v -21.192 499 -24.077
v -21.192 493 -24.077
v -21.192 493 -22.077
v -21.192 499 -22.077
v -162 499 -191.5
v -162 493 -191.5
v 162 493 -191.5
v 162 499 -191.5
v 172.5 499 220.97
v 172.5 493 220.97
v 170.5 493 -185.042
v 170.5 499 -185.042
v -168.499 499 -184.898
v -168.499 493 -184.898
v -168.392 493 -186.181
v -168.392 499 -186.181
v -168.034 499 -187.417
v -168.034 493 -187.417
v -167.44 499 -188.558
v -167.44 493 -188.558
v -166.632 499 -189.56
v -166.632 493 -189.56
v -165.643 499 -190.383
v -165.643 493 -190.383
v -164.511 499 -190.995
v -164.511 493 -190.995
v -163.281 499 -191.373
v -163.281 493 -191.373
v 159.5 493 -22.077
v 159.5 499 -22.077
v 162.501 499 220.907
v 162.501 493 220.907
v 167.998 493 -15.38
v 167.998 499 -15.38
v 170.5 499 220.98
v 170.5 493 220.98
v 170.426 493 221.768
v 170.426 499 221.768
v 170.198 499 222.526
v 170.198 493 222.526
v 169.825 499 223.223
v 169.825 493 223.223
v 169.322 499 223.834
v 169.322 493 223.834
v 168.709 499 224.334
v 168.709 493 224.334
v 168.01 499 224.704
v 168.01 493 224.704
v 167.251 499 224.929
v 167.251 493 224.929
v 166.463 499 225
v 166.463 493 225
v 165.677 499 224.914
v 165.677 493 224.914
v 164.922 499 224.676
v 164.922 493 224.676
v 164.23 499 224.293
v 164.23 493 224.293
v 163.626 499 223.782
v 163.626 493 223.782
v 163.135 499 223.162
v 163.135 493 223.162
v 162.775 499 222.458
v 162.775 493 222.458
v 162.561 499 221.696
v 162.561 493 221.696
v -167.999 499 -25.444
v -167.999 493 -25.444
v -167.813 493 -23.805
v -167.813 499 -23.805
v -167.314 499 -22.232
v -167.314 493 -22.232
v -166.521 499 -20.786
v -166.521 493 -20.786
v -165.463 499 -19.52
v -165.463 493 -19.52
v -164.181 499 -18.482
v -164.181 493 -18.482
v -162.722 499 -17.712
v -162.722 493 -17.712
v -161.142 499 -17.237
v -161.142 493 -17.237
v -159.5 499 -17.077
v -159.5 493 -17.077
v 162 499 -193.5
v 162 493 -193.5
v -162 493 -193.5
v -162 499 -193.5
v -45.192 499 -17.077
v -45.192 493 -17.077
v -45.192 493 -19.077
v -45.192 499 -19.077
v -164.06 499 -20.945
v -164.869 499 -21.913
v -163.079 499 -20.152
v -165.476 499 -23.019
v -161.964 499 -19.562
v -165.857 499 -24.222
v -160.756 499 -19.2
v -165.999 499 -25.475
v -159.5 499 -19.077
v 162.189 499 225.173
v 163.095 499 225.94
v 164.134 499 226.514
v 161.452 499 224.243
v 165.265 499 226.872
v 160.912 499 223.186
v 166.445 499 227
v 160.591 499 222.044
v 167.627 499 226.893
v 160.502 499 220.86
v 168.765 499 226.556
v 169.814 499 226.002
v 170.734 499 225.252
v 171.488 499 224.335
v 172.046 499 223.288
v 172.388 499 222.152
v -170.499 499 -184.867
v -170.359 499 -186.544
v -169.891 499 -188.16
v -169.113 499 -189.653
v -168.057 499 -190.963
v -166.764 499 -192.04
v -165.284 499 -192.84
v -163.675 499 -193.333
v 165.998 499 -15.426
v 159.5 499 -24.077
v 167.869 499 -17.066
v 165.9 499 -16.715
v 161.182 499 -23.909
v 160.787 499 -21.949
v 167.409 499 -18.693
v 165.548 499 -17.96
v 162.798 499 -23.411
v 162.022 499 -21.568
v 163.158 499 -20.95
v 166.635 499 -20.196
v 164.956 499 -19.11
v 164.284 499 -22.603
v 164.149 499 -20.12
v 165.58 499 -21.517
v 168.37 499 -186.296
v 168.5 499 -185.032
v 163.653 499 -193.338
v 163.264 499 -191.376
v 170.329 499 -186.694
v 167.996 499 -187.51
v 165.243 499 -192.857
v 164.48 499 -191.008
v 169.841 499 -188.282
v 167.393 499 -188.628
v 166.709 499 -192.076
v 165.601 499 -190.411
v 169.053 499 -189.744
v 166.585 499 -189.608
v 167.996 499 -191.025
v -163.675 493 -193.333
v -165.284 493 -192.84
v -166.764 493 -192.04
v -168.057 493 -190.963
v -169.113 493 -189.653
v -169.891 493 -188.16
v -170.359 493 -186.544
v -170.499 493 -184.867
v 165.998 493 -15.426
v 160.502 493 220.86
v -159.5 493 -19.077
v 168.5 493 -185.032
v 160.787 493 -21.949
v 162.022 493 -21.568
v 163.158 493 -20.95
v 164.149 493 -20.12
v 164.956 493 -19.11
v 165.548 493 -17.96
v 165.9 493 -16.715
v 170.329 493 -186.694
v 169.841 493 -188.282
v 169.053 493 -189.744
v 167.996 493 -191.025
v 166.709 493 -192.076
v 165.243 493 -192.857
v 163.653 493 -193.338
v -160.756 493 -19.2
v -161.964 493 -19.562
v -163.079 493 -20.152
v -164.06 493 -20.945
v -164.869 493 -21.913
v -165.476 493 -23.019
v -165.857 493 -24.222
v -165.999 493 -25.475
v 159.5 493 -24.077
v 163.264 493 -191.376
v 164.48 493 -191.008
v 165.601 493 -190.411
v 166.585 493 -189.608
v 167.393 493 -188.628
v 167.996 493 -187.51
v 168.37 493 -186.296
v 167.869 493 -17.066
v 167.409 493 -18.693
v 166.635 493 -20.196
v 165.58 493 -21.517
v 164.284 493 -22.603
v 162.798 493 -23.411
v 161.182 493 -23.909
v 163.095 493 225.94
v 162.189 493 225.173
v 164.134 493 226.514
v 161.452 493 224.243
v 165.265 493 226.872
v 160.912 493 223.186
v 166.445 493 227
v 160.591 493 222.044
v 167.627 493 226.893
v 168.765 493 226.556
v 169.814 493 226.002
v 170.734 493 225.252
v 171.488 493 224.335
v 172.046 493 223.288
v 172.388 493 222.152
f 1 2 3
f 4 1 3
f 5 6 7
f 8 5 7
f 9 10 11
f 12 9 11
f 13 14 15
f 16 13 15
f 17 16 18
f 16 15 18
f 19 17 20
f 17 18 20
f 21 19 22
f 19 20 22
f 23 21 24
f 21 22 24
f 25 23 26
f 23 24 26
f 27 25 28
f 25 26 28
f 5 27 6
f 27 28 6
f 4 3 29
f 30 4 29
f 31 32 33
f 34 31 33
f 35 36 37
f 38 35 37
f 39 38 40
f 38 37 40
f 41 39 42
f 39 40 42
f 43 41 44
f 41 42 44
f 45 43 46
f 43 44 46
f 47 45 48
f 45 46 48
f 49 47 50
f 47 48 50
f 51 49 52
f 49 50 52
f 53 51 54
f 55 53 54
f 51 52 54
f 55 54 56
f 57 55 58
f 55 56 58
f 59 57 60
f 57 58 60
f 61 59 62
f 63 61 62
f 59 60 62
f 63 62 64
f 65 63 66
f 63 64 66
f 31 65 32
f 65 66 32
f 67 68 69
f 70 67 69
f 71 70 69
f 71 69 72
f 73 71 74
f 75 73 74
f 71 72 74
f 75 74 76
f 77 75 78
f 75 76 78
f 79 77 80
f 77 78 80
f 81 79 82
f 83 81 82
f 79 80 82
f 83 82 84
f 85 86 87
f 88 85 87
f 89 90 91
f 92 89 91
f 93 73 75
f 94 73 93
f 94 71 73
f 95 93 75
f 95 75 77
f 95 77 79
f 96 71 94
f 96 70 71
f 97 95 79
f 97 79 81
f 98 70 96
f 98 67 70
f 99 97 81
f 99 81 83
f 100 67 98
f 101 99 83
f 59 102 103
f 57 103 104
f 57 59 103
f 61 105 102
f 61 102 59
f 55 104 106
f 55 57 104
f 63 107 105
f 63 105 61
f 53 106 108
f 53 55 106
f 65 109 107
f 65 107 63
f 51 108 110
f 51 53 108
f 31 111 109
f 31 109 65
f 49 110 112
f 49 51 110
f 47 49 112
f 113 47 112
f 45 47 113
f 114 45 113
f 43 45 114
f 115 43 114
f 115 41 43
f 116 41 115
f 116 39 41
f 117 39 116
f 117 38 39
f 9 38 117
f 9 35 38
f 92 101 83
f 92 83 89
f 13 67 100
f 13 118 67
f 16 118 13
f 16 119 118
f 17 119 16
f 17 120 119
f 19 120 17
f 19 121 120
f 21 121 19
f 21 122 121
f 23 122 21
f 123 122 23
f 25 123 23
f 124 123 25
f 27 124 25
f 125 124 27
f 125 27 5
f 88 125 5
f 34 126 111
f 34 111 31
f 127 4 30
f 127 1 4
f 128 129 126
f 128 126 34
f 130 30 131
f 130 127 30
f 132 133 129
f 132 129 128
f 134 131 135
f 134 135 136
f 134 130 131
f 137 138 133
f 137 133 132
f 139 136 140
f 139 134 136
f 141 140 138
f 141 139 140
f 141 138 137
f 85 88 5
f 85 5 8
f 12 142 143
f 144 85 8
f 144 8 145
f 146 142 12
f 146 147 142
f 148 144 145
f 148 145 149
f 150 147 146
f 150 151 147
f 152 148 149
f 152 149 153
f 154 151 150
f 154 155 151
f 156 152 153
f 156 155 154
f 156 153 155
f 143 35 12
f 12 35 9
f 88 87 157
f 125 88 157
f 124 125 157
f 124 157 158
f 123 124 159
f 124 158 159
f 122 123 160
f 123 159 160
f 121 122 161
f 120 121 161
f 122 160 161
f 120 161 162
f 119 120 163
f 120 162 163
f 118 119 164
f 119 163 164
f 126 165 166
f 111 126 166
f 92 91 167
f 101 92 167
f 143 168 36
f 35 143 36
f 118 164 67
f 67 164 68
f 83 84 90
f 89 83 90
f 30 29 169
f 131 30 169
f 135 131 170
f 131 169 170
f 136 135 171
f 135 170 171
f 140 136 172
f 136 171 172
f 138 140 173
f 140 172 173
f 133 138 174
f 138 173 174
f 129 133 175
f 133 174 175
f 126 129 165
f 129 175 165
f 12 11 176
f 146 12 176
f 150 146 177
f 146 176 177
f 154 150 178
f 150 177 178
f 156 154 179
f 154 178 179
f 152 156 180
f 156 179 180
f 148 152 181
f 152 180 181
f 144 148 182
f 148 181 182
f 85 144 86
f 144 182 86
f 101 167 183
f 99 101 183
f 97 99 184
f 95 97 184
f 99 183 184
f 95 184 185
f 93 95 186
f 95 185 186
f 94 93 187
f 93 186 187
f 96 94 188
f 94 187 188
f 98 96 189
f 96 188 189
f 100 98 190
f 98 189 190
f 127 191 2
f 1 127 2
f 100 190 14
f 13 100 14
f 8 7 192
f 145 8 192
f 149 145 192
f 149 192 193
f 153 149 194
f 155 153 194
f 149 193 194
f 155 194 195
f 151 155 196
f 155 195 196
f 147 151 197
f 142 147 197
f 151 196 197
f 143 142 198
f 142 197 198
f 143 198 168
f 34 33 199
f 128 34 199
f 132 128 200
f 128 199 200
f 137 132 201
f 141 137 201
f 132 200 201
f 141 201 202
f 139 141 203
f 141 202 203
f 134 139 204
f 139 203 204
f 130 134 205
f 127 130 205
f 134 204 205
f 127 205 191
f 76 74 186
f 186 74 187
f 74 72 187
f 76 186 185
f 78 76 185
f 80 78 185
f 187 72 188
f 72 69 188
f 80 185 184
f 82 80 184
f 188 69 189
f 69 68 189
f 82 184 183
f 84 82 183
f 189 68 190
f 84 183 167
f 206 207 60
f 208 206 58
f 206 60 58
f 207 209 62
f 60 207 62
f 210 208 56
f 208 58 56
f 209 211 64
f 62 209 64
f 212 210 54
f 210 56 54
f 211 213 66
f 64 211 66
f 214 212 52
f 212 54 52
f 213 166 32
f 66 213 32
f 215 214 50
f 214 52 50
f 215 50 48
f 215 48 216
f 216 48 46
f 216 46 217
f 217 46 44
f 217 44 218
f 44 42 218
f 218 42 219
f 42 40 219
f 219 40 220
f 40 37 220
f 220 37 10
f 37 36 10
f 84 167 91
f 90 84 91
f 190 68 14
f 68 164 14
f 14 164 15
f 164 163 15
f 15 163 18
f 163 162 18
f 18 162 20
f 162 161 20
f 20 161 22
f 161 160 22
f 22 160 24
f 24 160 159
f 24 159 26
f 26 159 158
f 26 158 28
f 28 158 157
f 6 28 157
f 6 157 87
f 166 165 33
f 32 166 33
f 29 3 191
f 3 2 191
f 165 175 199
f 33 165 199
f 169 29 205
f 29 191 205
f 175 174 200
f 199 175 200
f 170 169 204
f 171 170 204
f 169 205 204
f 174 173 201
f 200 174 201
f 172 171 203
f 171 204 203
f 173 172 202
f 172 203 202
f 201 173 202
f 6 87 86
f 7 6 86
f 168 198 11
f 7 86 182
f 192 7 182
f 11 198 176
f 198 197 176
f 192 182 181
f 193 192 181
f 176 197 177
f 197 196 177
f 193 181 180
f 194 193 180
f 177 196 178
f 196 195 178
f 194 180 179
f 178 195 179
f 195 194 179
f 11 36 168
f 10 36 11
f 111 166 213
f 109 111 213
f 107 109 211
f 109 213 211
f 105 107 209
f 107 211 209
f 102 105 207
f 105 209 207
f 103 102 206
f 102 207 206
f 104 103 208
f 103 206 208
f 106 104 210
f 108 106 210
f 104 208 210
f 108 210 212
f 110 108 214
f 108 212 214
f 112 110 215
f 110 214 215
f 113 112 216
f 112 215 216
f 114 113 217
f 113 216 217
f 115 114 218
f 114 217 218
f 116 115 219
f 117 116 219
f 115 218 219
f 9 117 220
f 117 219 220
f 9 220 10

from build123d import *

# Parameters (mm, degrees)
EXTRUDE_THIN1_DEPTH      = 5
EXTRUDE_THIN1_DEPTH_BACK = 1


with BuildPart() as part:
    # Sketch1 → Extrude-Thin1 (new, two sides: drawn at the far end of the back side and taken through both)
    with BuildSketch(Plane(origin=(0, 494, 0), x_dir=(1, 0, 0), z_dir=(0, 1, 0)).offset(-EXTRUDE_THIN1_DEPTH_BACK)):
        with BuildLine():
            Line((-21.192485275, 22.077376905), (159.5, 22.077376905))
            ThreePointArc((159.5, 22.077376905), (164.149331935, 20.119811555), (165.998241995, 15.426211538))
            Line((165.998241995, 15.426211538), (160.501622773, -220.860462738))
            ThreePointArc((160.501622773, -220.860462738), (166.44500383, -226.999747946), (172.499927204, -220.970444157))
            Line((172.499927204, -220.970444157), (170.499896872, 185.041870778))
            ThreePointArc((170.499896872, 185.041870778), (167.995585809, 191.02519301), (162, 193.5))
            Line((162, 193.5), (-162, 193.5))
            ThreePointArc((-162, 193.5), (-168.057344942, 190.963100892), (-170.498955066, 184.866722883))
            Line((-170.498955066, 184.866722883), (-167.998955066, 25.444099787))
            ThreePointArc((-167.998955066, 25.444099787), (-165.463100892, 19.520031962), (-159.5, 17.077376905))
            Line((-159.5, 17.077376905), (-45.192485275, 17.077376905))
            Line((-45.192485275, 17.077376905), (-45.192485275, 19.077376905))
            Line((-45.192485275, 19.077376905), (-159.5, 19.077376905))
            ThreePointArc((-159.5, 19.077376905), (-164.060018329, 20.945289596), (-165.999200933, 25.475459109))
            Line((-165.999200933, 25.475459109), (-168.499200933, 184.898082204))
            ThreePointArc((-168.499200933, 184.898082204), (-166.632087309, 189.560018329), (-162, 191.5))
            Line((-162, 191.5), (162, 191.5))
            ThreePointArc((162, 191.5), (166.584859736, 189.607500537), (168.499921138, 185.03201883))
            Line((168.499921138, 185.03201883), (170.499951469, -220.980296104))
            ThreePointArc((170.499951469, -220.980296104), (166.463335887, -224.999831964), (162.501081849, -220.906975159))
            Line((162.501081849, -220.906975159), (167.997701071, 15.379699117))
            ThreePointArc((167.997701071, 15.379699117), (165.579895607, 21.517483756), (159.5, 24.077376905))
            Line((159.5, 24.077376905), (-21.192485275, 24.077376905))
            Line((-21.192485275, 24.077376905), (-21.192485275, 22.077376905))
        make_face()
    extrude(amount=EXTRUDE_THIN1_DEPTH + EXTRUDE_THIN1_DEPTH_BACK)


solid = part.part
